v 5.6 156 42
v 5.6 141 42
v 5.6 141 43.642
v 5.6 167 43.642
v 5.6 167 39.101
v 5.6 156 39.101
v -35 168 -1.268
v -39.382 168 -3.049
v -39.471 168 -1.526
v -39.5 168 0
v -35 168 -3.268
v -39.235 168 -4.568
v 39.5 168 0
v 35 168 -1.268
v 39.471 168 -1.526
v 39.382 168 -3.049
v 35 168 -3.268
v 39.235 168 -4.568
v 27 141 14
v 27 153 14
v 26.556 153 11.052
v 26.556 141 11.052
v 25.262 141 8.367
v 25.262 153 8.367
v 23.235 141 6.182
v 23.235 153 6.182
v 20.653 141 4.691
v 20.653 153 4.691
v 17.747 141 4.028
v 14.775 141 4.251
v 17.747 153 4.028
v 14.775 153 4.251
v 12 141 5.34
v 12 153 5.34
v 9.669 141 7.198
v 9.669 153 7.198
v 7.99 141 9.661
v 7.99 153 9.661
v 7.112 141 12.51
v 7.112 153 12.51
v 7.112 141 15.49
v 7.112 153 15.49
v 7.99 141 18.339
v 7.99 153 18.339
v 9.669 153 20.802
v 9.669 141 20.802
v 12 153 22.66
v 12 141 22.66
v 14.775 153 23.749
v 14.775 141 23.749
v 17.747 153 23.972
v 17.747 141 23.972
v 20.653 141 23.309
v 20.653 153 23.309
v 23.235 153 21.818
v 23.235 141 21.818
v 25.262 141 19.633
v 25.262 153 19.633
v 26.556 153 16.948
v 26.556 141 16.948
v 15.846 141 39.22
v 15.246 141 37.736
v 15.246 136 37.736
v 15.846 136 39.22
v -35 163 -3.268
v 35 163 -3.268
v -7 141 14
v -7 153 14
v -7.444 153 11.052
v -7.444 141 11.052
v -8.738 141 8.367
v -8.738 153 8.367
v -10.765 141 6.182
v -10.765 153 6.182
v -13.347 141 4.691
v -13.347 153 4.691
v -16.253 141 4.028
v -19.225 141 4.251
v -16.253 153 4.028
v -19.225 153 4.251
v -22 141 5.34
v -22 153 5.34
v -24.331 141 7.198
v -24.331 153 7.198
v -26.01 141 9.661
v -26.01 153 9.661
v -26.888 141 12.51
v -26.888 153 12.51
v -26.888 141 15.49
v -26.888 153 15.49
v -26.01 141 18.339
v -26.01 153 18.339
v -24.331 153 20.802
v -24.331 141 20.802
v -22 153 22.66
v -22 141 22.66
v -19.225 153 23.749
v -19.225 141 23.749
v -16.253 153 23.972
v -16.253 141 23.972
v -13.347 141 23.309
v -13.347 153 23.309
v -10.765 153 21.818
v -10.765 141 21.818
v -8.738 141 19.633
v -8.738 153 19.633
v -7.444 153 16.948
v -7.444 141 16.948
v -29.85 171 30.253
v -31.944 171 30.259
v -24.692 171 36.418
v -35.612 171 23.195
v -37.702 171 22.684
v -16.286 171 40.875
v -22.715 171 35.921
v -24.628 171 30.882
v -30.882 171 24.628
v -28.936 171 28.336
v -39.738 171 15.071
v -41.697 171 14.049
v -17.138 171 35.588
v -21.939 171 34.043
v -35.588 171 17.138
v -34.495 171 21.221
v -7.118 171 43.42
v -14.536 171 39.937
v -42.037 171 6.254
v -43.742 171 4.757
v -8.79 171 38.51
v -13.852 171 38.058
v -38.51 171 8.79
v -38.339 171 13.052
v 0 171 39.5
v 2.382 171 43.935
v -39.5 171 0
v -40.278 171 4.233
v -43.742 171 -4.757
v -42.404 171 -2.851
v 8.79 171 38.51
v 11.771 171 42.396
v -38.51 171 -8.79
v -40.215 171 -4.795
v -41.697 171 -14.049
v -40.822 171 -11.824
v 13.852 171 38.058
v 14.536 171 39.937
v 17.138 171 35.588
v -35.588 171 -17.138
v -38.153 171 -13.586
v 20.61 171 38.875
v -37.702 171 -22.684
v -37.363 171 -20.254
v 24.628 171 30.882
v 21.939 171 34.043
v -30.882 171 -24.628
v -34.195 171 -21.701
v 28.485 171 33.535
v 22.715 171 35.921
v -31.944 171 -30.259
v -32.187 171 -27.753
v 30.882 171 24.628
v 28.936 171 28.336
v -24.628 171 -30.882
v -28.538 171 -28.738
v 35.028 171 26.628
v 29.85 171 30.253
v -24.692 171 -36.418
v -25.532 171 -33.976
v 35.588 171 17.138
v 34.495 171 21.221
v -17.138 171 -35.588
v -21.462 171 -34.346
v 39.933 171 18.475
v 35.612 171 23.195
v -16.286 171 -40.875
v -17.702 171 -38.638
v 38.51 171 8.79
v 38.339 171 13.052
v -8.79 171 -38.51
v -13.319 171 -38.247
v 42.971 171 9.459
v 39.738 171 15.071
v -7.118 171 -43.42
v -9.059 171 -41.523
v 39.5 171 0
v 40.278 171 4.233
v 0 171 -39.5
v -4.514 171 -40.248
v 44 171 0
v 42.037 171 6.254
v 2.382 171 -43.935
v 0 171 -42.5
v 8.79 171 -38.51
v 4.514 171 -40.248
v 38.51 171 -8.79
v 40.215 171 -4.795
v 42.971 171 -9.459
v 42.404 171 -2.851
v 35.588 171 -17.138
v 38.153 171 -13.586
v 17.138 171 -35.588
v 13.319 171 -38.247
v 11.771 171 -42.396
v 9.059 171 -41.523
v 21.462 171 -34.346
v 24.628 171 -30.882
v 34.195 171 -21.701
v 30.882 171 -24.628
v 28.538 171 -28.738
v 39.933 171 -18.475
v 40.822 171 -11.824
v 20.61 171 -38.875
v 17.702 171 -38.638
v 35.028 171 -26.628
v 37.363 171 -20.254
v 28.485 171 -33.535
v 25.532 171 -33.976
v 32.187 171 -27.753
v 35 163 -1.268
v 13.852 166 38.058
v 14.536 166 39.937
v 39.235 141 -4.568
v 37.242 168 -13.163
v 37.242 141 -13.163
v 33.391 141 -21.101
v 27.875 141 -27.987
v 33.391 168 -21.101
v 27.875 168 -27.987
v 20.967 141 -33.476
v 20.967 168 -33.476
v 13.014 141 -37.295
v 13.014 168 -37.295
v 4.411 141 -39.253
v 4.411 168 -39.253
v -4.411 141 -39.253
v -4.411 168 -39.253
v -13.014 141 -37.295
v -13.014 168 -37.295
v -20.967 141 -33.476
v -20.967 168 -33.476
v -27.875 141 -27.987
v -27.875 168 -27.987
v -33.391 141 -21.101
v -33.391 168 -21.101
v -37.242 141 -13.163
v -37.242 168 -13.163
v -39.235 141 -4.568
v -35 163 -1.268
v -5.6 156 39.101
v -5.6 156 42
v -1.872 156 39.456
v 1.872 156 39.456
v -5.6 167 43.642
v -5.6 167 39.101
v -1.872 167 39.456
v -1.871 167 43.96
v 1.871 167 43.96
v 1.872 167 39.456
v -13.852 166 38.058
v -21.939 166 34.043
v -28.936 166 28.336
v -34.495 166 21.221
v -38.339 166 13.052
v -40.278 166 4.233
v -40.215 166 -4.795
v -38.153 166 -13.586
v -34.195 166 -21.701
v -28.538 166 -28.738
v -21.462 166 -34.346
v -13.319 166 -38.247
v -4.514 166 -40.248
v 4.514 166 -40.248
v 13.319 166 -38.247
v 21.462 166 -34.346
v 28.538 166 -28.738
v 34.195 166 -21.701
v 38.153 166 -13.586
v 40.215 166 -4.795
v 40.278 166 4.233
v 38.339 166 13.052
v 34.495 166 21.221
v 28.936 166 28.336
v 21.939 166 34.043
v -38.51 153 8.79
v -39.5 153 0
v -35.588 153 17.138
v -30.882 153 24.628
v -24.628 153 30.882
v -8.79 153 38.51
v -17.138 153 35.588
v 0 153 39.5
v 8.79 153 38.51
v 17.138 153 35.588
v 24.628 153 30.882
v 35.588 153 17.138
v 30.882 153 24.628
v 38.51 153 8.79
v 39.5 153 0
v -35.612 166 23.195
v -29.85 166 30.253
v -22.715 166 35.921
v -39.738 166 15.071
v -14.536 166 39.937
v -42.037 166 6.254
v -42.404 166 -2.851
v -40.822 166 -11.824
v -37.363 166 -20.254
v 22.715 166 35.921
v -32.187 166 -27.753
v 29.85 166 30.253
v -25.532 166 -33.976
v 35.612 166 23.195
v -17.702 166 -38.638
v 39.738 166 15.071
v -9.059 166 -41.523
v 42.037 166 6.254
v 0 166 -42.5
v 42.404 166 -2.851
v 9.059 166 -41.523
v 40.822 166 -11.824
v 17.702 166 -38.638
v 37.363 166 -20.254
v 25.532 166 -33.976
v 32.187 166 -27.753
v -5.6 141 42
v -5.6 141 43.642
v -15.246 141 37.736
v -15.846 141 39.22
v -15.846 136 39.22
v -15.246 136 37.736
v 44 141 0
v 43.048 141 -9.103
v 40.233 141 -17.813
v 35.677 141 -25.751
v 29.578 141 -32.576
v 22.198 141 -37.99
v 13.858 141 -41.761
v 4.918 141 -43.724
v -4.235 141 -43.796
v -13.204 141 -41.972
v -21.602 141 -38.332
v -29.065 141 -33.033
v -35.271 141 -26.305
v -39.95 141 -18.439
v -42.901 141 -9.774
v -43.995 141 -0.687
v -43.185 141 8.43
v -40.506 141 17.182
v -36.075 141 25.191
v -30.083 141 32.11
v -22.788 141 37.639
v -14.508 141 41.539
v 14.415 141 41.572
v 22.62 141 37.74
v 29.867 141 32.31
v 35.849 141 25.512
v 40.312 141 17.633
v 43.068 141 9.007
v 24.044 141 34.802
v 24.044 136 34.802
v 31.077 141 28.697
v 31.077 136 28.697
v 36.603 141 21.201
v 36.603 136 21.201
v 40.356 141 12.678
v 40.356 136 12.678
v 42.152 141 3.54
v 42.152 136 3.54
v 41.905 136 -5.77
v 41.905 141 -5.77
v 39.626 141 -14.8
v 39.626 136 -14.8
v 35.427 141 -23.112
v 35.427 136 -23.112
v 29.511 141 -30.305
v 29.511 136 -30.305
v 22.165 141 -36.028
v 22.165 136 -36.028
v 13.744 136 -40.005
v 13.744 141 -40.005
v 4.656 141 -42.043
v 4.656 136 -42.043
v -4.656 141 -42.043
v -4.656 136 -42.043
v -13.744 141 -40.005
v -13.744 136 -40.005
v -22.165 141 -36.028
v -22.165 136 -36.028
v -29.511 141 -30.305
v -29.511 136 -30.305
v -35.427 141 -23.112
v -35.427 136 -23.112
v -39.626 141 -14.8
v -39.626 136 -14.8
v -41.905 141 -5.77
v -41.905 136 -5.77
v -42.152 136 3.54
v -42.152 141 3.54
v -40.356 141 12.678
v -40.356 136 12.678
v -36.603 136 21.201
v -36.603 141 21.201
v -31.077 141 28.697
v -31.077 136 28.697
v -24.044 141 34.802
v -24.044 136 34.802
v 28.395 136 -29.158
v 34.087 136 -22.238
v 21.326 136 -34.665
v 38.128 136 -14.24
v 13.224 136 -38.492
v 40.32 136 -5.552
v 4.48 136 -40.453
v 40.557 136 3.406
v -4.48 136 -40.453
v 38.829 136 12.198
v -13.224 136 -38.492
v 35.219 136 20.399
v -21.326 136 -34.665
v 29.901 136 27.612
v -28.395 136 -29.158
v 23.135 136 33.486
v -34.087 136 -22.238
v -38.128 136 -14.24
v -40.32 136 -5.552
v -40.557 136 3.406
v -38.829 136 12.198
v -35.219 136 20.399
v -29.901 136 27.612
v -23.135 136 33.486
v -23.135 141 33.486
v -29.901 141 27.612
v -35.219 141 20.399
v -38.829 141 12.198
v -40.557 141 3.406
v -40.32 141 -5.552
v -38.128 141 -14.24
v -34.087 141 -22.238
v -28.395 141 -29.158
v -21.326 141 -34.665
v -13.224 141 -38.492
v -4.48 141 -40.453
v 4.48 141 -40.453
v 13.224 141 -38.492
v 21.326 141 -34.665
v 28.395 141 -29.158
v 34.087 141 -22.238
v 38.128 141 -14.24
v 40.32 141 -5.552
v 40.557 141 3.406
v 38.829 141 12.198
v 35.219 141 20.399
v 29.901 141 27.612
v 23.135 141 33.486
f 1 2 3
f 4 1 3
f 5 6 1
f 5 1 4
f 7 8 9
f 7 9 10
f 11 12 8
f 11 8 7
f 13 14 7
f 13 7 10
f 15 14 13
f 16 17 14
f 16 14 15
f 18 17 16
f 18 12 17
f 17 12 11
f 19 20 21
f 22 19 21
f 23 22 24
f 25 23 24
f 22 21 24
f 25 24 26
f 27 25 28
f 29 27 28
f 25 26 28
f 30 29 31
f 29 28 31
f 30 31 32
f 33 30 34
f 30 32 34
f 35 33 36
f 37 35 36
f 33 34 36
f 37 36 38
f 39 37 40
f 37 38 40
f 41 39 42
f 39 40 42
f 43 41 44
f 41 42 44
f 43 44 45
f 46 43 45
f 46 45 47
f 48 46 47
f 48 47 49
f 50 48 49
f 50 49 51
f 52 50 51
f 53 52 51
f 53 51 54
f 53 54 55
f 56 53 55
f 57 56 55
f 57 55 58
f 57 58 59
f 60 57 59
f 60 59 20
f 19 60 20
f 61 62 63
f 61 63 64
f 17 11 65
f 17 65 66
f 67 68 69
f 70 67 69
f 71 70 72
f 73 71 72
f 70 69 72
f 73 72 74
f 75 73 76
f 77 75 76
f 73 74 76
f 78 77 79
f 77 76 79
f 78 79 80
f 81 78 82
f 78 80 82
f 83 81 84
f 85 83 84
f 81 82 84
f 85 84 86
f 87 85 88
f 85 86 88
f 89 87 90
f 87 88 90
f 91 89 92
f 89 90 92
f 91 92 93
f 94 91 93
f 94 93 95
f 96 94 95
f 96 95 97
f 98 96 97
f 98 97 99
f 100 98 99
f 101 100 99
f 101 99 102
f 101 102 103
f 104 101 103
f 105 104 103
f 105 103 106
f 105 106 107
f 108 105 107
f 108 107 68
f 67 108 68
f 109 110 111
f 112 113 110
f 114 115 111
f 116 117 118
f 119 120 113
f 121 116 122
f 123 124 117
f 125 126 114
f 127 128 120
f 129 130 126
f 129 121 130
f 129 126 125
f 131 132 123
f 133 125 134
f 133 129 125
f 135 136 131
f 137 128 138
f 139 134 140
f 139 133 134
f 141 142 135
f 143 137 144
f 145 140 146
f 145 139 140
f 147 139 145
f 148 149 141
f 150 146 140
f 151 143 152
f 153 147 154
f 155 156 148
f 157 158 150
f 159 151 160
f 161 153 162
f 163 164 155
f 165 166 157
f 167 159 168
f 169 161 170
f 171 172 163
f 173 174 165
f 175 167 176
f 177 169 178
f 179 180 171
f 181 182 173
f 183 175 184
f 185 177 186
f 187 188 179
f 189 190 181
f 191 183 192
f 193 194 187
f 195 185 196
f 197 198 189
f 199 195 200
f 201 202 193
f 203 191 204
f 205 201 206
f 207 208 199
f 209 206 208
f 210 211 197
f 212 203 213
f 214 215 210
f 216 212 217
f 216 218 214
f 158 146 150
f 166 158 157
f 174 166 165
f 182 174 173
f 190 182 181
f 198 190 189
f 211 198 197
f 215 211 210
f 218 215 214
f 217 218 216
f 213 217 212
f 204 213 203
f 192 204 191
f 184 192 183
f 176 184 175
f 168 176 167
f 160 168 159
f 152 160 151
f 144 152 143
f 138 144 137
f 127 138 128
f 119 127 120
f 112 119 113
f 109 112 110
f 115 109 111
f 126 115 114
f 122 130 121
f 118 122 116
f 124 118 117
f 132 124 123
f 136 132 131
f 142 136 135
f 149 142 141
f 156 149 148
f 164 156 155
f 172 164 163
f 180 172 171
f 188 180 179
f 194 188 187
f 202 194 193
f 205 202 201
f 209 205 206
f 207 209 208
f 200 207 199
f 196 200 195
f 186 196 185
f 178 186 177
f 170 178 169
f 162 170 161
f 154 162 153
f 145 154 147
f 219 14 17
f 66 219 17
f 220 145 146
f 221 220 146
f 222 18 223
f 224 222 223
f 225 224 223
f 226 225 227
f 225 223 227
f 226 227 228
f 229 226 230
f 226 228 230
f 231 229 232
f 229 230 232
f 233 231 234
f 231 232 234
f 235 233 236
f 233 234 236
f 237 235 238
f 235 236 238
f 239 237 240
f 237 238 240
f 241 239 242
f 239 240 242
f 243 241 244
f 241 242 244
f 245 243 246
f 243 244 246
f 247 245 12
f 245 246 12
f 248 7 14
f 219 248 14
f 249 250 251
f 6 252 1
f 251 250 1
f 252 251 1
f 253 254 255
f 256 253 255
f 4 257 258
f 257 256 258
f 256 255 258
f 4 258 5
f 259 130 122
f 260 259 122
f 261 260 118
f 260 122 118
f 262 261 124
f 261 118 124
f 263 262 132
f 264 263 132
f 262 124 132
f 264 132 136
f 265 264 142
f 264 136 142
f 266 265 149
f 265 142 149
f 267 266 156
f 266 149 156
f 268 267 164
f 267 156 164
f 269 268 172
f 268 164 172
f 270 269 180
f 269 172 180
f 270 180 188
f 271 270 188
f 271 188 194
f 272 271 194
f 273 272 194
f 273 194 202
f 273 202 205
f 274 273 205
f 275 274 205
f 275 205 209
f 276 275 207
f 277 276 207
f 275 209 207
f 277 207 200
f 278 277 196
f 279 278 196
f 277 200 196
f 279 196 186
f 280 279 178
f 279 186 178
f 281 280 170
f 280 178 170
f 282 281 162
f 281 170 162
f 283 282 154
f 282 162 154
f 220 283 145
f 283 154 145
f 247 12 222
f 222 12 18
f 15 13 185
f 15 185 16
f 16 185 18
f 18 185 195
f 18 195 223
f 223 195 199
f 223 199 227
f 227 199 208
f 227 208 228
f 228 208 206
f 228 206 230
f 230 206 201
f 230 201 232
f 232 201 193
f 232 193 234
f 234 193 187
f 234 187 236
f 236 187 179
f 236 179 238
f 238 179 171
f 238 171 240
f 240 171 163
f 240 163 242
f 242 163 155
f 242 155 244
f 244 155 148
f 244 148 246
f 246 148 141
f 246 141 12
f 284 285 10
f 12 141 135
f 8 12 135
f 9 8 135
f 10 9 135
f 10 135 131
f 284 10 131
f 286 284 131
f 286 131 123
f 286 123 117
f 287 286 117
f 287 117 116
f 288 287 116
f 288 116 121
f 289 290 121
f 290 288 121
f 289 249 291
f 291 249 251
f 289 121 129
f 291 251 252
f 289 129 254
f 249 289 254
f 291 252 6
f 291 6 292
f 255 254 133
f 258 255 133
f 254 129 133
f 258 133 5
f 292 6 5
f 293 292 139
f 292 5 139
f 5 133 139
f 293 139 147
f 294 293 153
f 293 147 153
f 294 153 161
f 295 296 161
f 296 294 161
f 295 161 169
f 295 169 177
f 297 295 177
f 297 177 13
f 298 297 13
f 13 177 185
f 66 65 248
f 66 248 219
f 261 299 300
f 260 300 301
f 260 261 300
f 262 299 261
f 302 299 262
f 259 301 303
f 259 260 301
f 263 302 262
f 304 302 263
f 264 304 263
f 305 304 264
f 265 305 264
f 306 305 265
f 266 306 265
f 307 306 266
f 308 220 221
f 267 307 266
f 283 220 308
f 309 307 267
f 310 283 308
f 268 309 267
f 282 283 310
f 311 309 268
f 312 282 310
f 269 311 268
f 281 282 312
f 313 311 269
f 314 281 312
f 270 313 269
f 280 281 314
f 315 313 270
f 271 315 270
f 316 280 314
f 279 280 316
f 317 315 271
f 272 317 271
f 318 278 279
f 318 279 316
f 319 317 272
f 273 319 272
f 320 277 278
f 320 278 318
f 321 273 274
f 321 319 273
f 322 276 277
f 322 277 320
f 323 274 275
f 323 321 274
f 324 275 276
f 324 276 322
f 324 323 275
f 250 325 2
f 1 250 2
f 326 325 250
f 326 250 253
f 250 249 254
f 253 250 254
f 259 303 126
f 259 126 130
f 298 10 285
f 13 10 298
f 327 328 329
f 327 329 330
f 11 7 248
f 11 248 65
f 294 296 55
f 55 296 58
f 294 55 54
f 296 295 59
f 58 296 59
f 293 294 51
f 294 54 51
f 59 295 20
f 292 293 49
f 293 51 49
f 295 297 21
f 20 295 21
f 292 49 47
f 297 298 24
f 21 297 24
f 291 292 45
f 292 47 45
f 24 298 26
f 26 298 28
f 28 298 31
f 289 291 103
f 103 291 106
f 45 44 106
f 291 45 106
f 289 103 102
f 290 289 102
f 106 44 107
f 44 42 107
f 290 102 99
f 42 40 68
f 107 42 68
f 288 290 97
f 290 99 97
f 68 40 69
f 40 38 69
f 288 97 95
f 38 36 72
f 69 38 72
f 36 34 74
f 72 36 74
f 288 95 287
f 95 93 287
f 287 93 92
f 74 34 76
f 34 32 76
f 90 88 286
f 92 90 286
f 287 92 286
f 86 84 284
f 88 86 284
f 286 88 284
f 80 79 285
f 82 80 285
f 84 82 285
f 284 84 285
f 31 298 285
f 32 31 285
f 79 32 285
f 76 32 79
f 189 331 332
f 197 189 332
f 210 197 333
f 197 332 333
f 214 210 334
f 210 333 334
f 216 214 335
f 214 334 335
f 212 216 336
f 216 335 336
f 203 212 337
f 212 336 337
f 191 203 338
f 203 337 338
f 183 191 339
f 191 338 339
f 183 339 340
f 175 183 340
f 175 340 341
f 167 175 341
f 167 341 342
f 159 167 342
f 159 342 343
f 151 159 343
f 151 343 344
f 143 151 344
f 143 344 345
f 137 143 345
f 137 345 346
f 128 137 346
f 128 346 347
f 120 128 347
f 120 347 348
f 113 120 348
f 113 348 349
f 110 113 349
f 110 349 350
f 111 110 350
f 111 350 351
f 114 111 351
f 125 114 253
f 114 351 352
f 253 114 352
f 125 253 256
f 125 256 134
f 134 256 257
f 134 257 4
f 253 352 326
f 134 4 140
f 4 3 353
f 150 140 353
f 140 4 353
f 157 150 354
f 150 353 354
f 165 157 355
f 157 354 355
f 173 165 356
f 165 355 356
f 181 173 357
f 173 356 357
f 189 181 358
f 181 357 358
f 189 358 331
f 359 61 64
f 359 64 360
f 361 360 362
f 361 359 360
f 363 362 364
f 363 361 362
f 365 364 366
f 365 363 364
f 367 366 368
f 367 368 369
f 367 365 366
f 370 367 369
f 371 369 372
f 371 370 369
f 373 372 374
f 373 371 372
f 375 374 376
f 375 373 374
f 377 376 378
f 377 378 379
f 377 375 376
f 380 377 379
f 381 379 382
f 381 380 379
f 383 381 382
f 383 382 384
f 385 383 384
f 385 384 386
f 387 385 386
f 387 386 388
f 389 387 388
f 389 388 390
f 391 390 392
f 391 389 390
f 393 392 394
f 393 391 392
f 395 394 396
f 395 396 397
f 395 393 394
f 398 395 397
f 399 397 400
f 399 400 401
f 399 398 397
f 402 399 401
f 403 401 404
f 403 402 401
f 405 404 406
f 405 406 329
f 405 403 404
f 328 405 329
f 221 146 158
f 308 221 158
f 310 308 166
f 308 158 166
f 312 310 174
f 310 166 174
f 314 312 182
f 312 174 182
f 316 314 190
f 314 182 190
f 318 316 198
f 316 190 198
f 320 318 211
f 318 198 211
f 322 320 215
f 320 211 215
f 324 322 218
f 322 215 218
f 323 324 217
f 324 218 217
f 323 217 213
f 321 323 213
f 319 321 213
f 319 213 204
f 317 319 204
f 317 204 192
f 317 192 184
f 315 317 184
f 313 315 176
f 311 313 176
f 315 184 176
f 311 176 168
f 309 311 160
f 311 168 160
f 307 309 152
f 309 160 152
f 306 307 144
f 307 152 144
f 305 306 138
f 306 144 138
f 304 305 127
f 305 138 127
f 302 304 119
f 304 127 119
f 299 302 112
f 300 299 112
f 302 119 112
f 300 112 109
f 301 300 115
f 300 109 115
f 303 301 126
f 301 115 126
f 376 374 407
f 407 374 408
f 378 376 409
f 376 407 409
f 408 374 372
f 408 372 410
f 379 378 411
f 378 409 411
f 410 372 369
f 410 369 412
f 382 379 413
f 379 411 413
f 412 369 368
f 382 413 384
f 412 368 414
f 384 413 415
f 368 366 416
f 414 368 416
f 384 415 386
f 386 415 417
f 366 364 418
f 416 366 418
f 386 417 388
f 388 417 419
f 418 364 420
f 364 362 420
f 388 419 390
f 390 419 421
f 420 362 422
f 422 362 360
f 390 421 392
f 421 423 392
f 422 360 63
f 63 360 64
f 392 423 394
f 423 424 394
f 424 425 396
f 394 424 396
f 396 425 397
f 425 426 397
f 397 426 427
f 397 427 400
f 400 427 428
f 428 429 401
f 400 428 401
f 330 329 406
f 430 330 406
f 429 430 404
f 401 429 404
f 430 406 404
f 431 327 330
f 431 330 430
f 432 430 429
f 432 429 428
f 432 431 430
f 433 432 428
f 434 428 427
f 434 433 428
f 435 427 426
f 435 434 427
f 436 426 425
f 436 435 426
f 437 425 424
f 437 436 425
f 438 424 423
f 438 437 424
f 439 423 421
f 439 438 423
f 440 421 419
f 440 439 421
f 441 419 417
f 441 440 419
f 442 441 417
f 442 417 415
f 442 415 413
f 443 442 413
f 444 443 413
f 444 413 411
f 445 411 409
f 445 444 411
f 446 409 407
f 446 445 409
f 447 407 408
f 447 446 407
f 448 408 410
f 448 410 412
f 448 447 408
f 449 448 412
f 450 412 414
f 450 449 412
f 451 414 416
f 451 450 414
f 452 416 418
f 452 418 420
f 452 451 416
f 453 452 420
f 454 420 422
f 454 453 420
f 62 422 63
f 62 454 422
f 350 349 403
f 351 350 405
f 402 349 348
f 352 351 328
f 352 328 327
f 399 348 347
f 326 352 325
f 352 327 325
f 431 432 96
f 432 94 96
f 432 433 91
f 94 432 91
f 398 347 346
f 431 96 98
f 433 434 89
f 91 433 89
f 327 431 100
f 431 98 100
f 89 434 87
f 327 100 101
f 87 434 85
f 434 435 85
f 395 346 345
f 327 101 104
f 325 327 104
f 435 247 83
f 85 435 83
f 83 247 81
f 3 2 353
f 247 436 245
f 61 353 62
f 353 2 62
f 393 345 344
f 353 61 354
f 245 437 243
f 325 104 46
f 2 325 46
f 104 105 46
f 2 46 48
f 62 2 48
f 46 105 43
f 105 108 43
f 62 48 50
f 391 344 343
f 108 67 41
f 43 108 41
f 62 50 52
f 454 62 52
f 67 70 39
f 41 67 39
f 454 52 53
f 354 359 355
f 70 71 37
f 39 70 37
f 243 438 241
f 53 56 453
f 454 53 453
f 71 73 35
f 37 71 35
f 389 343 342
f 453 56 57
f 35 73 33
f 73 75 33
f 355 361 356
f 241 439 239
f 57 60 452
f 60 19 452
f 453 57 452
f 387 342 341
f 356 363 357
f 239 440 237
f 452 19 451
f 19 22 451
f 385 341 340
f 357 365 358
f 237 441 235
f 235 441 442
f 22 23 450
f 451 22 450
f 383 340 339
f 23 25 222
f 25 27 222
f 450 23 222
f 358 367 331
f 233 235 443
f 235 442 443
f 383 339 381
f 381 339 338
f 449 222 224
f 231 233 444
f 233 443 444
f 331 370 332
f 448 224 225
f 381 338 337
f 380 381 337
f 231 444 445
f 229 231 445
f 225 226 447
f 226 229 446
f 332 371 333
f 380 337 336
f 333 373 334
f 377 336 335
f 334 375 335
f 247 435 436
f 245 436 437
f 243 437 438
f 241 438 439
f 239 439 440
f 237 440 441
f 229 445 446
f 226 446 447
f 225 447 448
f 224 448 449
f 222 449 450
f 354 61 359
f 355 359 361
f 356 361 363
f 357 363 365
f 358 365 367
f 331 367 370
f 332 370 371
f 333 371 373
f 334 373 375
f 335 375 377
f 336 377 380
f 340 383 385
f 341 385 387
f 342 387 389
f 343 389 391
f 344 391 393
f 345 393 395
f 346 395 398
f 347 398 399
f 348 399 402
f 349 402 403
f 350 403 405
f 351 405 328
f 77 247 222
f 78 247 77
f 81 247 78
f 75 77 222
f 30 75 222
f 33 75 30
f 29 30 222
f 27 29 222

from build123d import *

# Parameters (mm, degrees)
SKETCH1_R           = 44
BOSS_EXTRUDE1_DEPTH = 180
SKETCH7_R           = 39.5
CUT_EXTRUDE1_DEPTH  = 115
SKETCH8_R           = 35
CUT_EXTRUDE2_DEPTH  = 18
SKETCH12_W          = 11.2
SKETCH12_H          = 156.702496638
CUT_EXTRUDE5_DEPTH  = 13.6
SKETCH14_W          = 11.2
SKETCH14_H          = 8.676367157
CUT_EXTRUDE6_DEPTH  = 18
SKETCH18_R          = 39.5
CUT_EXTRUDE8_DEPTH  = 12
CUT_EXTRUDE4_DEPTH  = 21
CUT_EXTRUDE9_DEPTH  = 28
SKETCH21_R          = 44
CUT_EXTRUDE10_DEPTH = 10
CUT_EXTRUDE11_DEPTH = 50
SKETCH24_R          = 10
CUT_EXTRUDE12_DEPTH = 16
SKETCH26_W          = 11.2
SKETCH26_H          = 11
CUT_EXTRUDE13_DEPTH = 14
SKETCH27_R          = 39
CUT_EXTRUDE14_DEPTH = 30
SKETCH28_R          = 47
SKETCH28_R_2        = 42
BOSS_EXTRUDE2_DEPTH = 20
CUT_EXTRUDE15_DEPTH = 40
SKETCH30_R          = 47
CUT_EXTRUDE16_DEPTH = 20
SKETCH33_R          = 44
CUT_EXTRUDE17_DEPTH = 137
BOSS_EXTRUDE4_DEPTH = 5
SKETCH35_W          = 70
SKETCH35_H          = 2
CUT_EXTRUDE18_DEPTH = 5
SKETCH37_R          = 44
CUT_EXTRUDE19_DEPTH = 9
CUT_EXTRUDE20_DEPTH = 5


with BuildPart() as part:
    # Sketch1 → Boss-Extrude1 (new body)
    with BuildSketch(Plane(origin=(0, 0, 0), x_dir=(1, 0, 0), z_dir=(0, 1, 0))):
        Circle(SKETCH1_R)
    extrude(amount=BOSS_EXTRUDE1_DEPTH)

    # Sketch7 → Cut-Extrude1 (cut)
    with BuildSketch(Plane(origin=(0, 25, 0), x_dir=(1, 0, 0), z_dir=(0, 1, 0))):
        Circle(SKETCH7_R)
    extrude(amount=CUT_EXTRUDE1_DEPTH, mode=Mode.SUBTRACT)

    # Sketch8 → Cut-Extrude2 (cut)
    with BuildSketch(Plane(origin=(0, 41, 0), x_dir=(1, 0, 0), z_dir=(0, 1, 0))):
        Circle(SKETCH8_R)
    extrude(amount=-CUT_EXTRUDE2_DEPTH, mode=Mode.SUBTRACT)

    # Sketch12 → Cut-Extrude5 (cut)
    with BuildSketch(Plane.XY.offset(42)):
        with Locations((0, 88.648751681)):
            Rectangle(SKETCH12_W, SKETCH12_H)
    extrude(amount=CUT_EXTRUDE5_DEPTH, mode=Mode.SUBTRACT)

    # Sketch14 → Cut-Extrude6 (cut)
    with BuildSketch(Plane.XY.offset(42)):
        with Locations((0, 14.635686941)):
            Rectangle(SKETCH14_W, SKETCH14_H)
    extrude(amount=-CUT_EXTRUDE6_DEPTH, mode=Mode.SUBTRACT)

    # Sketch18 → Cut-Extrude8 (cut)
    with BuildSketch(Plane(origin=(0, 180, 0), x_dir=(1, 0, 0), z_dir=(0, 1, 0))):
        Circle(SKETCH18_R)
    extrude(amount=-CUT_EXTRUDE8_DEPTH, mode=Mode.SUBTRACT)

    # Sketch10 → Cut-Extrude4 (cut, symmetric)
    with BuildSketch(Plane(origin=(0, 174, 0), x_dir=(1, 0, 0), z_dir=(0, 1, 0))):
        with BuildLine():
            Line((-39.5, 0), (39.5, 0))
            ThreePointArc((39.5, 0), (0, -39.5), (-39.5, 0))
        make_face()
    extrude(amount=CUT_EXTRUDE4_DEPTH, both=True, mode=Mode.SUBTRACT)

    # Sketch20 → Cut-Extrude9 (cut)
    with BuildSketch(Plane(origin=(0, 168, 0), x_dir=(1, 0, 0), z_dir=(0, 1, 0))):
        with BuildLine():
            Line((9, 26), (-15, 26))
            ThreePointArc((-15, 26), (-18.535533906, 24.535533906), (-20, 21))
            Line((-20, 21), (-20, 10))
            ThreePointArc((-20, 10), (-18.535533906, 6.464466094), (-15, 5))
            Line((-15, 5), (9, 5))
            ThreePointArc((9, 5), (12.535533906, 6.464466094), (14, 10))
            Line((14, 10), (14, 21))
            ThreePointArc((14, 21), (12.535533906, 24.535533906), (9, 26))
        make_face()
    extrude(amount=-CUT_EXTRUDE9_DEPTH, mode=Mode.SUBTRACT)

    # Sketch21 → Cut-Extrude10 (cut)
    with BuildSketch(Plane(origin=(0, 5, 0), x_dir=(1, 0, 0), z_dir=(0, 1, 0))):
        Circle(SKETCH21_R)
    extrude(amount=-CUT_EXTRUDE10_DEPTH, mode=Mode.SUBTRACT)

    # Sketch23 → Cut-Extrude11 (cut)
    with BuildSketch(Plane(origin=(0, 168, 0), x_dir=(1, 0, 0), z_dir=(0, 1, 0))):
        with BuildLine():
            Line((-34.700571143, 4.568409172), (34.700571143, 4.568409172))
            ThreePointArc((34.700571143, 4.568409172), (0, 35), (-34.700571143, 4.568409172))
        make_face()
    extrude(amount=-CUT_EXTRUDE11_DEPTH, mode=Mode.SUBTRACT)

    # Sketch24 → Cut-Extrude12 (cut)
    with BuildSketch(Plane(origin=(0, 153, 0), x_dir=(1, 0, 0), z_dir=(0, 1, 0))):
        with Locations((-17, -14)):
            Circle(SKETCH24_R)
        with Locations((17, -14)):
            Circle(SKETCH24_R)
    extrude(amount=-CUT_EXTRUDE12_DEPTH, mode=Mode.SUBTRACT)

    # Sketch26 → Cut-Extrude13 (cut)
    with BuildSketch(Plane.XY.offset(42)):
        with Locations((0, 161.5)):
            Rectangle(SKETCH26_W, SKETCH26_H)
    extrude(amount=-CUT_EXTRUDE13_DEPTH, mode=Mode.SUBTRACT)

    # Sketch27 → Cut-Extrude14 (cut)
    with BuildSketch(Plane.XZ.offset(-5)):
        Circle(SKETCH27_R)
    extrude(amount=-CUT_EXTRUDE14_DEPTH, mode=Mode.SUBTRACT)

    # Sketch28 → Boss-Extrude2 (add)
    with BuildSketch(Plane.XZ.offset(-5)):
        Circle(SKETCH28_R)
        Circle(SKETCH28_R_2, mode=Mode.SUBTRACT)
    extrude(amount=BOSS_EXTRUDE2_DEPTH)

    # Sketch29 → Cut-Extrude15 (cut)
    with BuildSketch(Plane(origin=(0, 168, 0), x_dir=(1, 0, 0), z_dir=(0, 1, 0))):
        with BuildLine():
            Line((-39.234928796, 4.568409172), (-34.700571143, 4.568409172))
            ThreePointArc((-34.700571143, 4.568409172), (0, 35), (34.700571143, 4.568409172))
            Line((34.700571143, 4.568409172), (39.234928796, 4.568409172))
            ThreePointArc((39.234928796, 4.568409172), (0, 39.5), (-39.234928796, 4.568409172))
        make_face()
    extrude(amount=-CUT_EXTRUDE15_DEPTH, mode=Mode.SUBTRACT)

    # Sketch30 → Cut-Extrude16 (cut)
    with BuildSketch(Plane.XZ.offset(15)):
        Circle(SKETCH30_R)
    extrude(amount=-CUT_EXTRUDE16_DEPTH, mode=Mode.SUBTRACT)

    # Sketch33 → Cut-Extrude17 (cut, through all)
    with BuildSketch(Plane(origin=(0, 141, 0), x_dir=(1, 0, 0), z_dir=(0, 1, 0))):
        Circle(SKETCH33_R)
    extrude(amount=-CUT_EXTRUDE17_DEPTH, mode=Mode.SUBTRACT)

    # Sketch34 → Boss-Extrude4 (add)
    with BuildSketch(Plane.XZ.offset(-141)):
        with BuildLine():
            Line((15.246488352, 37.736382881), (15.845858901, 39.219877048))
            ThreePointArc((15.845858901, 39.219877048), (0, -42.3), (-15.845858901, 39.219877048))
            Line((-15.845858901, 39.219877048), (-15.246488352, 37.736382881))
            ThreePointArc((-15.246488352, 37.736382881), (0, -40.7), (15.246488352, 37.736382881))
        make_face()
    extrude(amount=BOSS_EXTRUDE4_DEPTH)

    # Sketch35 → Cut-Extrude18 (cut)
    with BuildSketch(Plane(origin=(0, 168, 0), x_dir=(1, 0, 0), z_dir=(0, 1, 0))):
        with Locations((0, 2.268409172)):
            Rectangle(SKETCH35_W, SKETCH35_H)
    extrude(amount=-CUT_EXTRUDE18_DEPTH, mode=Mode.SUBTRACT)

    # Sketch37 → Cut-Extrude19 (cut)
    with BuildSketch(Plane(origin=(0, 180, 0), x_dir=(1, 0, 0), z_dir=(0, 1, 0))):
        Circle(SKETCH37_R)
    extrude(amount=-CUT_EXTRUDE19_DEPTH, mode=Mode.SUBTRACT)

    # Sketch38 → Cut-Extrude20 (cut)
    with BuildSketch(Plane(origin=(0, 171, 0), x_dir=(1, 0, 0), z_dir=(0, 1, 0))):
        with BuildLine():
            Line((-14.535856091, -39.936936383), (-13.851815805, -38.057551142))
            ThreePointArc((-13.851815805, -38.057551142), (0, 40.5), (13.851815805, -38.057551142))
            Line((13.851815805, -38.057551142), (14.535856091, -39.936936383))
            ThreePointArc((14.535856091, -39.936936383), (0, 42.5), (-14.535856091, -39.936936383))
        make_face()
    extrude(amount=-CUT_EXTRUDE20_DEPTH, mode=Mode.SUBTRACT)


solid = part.part
